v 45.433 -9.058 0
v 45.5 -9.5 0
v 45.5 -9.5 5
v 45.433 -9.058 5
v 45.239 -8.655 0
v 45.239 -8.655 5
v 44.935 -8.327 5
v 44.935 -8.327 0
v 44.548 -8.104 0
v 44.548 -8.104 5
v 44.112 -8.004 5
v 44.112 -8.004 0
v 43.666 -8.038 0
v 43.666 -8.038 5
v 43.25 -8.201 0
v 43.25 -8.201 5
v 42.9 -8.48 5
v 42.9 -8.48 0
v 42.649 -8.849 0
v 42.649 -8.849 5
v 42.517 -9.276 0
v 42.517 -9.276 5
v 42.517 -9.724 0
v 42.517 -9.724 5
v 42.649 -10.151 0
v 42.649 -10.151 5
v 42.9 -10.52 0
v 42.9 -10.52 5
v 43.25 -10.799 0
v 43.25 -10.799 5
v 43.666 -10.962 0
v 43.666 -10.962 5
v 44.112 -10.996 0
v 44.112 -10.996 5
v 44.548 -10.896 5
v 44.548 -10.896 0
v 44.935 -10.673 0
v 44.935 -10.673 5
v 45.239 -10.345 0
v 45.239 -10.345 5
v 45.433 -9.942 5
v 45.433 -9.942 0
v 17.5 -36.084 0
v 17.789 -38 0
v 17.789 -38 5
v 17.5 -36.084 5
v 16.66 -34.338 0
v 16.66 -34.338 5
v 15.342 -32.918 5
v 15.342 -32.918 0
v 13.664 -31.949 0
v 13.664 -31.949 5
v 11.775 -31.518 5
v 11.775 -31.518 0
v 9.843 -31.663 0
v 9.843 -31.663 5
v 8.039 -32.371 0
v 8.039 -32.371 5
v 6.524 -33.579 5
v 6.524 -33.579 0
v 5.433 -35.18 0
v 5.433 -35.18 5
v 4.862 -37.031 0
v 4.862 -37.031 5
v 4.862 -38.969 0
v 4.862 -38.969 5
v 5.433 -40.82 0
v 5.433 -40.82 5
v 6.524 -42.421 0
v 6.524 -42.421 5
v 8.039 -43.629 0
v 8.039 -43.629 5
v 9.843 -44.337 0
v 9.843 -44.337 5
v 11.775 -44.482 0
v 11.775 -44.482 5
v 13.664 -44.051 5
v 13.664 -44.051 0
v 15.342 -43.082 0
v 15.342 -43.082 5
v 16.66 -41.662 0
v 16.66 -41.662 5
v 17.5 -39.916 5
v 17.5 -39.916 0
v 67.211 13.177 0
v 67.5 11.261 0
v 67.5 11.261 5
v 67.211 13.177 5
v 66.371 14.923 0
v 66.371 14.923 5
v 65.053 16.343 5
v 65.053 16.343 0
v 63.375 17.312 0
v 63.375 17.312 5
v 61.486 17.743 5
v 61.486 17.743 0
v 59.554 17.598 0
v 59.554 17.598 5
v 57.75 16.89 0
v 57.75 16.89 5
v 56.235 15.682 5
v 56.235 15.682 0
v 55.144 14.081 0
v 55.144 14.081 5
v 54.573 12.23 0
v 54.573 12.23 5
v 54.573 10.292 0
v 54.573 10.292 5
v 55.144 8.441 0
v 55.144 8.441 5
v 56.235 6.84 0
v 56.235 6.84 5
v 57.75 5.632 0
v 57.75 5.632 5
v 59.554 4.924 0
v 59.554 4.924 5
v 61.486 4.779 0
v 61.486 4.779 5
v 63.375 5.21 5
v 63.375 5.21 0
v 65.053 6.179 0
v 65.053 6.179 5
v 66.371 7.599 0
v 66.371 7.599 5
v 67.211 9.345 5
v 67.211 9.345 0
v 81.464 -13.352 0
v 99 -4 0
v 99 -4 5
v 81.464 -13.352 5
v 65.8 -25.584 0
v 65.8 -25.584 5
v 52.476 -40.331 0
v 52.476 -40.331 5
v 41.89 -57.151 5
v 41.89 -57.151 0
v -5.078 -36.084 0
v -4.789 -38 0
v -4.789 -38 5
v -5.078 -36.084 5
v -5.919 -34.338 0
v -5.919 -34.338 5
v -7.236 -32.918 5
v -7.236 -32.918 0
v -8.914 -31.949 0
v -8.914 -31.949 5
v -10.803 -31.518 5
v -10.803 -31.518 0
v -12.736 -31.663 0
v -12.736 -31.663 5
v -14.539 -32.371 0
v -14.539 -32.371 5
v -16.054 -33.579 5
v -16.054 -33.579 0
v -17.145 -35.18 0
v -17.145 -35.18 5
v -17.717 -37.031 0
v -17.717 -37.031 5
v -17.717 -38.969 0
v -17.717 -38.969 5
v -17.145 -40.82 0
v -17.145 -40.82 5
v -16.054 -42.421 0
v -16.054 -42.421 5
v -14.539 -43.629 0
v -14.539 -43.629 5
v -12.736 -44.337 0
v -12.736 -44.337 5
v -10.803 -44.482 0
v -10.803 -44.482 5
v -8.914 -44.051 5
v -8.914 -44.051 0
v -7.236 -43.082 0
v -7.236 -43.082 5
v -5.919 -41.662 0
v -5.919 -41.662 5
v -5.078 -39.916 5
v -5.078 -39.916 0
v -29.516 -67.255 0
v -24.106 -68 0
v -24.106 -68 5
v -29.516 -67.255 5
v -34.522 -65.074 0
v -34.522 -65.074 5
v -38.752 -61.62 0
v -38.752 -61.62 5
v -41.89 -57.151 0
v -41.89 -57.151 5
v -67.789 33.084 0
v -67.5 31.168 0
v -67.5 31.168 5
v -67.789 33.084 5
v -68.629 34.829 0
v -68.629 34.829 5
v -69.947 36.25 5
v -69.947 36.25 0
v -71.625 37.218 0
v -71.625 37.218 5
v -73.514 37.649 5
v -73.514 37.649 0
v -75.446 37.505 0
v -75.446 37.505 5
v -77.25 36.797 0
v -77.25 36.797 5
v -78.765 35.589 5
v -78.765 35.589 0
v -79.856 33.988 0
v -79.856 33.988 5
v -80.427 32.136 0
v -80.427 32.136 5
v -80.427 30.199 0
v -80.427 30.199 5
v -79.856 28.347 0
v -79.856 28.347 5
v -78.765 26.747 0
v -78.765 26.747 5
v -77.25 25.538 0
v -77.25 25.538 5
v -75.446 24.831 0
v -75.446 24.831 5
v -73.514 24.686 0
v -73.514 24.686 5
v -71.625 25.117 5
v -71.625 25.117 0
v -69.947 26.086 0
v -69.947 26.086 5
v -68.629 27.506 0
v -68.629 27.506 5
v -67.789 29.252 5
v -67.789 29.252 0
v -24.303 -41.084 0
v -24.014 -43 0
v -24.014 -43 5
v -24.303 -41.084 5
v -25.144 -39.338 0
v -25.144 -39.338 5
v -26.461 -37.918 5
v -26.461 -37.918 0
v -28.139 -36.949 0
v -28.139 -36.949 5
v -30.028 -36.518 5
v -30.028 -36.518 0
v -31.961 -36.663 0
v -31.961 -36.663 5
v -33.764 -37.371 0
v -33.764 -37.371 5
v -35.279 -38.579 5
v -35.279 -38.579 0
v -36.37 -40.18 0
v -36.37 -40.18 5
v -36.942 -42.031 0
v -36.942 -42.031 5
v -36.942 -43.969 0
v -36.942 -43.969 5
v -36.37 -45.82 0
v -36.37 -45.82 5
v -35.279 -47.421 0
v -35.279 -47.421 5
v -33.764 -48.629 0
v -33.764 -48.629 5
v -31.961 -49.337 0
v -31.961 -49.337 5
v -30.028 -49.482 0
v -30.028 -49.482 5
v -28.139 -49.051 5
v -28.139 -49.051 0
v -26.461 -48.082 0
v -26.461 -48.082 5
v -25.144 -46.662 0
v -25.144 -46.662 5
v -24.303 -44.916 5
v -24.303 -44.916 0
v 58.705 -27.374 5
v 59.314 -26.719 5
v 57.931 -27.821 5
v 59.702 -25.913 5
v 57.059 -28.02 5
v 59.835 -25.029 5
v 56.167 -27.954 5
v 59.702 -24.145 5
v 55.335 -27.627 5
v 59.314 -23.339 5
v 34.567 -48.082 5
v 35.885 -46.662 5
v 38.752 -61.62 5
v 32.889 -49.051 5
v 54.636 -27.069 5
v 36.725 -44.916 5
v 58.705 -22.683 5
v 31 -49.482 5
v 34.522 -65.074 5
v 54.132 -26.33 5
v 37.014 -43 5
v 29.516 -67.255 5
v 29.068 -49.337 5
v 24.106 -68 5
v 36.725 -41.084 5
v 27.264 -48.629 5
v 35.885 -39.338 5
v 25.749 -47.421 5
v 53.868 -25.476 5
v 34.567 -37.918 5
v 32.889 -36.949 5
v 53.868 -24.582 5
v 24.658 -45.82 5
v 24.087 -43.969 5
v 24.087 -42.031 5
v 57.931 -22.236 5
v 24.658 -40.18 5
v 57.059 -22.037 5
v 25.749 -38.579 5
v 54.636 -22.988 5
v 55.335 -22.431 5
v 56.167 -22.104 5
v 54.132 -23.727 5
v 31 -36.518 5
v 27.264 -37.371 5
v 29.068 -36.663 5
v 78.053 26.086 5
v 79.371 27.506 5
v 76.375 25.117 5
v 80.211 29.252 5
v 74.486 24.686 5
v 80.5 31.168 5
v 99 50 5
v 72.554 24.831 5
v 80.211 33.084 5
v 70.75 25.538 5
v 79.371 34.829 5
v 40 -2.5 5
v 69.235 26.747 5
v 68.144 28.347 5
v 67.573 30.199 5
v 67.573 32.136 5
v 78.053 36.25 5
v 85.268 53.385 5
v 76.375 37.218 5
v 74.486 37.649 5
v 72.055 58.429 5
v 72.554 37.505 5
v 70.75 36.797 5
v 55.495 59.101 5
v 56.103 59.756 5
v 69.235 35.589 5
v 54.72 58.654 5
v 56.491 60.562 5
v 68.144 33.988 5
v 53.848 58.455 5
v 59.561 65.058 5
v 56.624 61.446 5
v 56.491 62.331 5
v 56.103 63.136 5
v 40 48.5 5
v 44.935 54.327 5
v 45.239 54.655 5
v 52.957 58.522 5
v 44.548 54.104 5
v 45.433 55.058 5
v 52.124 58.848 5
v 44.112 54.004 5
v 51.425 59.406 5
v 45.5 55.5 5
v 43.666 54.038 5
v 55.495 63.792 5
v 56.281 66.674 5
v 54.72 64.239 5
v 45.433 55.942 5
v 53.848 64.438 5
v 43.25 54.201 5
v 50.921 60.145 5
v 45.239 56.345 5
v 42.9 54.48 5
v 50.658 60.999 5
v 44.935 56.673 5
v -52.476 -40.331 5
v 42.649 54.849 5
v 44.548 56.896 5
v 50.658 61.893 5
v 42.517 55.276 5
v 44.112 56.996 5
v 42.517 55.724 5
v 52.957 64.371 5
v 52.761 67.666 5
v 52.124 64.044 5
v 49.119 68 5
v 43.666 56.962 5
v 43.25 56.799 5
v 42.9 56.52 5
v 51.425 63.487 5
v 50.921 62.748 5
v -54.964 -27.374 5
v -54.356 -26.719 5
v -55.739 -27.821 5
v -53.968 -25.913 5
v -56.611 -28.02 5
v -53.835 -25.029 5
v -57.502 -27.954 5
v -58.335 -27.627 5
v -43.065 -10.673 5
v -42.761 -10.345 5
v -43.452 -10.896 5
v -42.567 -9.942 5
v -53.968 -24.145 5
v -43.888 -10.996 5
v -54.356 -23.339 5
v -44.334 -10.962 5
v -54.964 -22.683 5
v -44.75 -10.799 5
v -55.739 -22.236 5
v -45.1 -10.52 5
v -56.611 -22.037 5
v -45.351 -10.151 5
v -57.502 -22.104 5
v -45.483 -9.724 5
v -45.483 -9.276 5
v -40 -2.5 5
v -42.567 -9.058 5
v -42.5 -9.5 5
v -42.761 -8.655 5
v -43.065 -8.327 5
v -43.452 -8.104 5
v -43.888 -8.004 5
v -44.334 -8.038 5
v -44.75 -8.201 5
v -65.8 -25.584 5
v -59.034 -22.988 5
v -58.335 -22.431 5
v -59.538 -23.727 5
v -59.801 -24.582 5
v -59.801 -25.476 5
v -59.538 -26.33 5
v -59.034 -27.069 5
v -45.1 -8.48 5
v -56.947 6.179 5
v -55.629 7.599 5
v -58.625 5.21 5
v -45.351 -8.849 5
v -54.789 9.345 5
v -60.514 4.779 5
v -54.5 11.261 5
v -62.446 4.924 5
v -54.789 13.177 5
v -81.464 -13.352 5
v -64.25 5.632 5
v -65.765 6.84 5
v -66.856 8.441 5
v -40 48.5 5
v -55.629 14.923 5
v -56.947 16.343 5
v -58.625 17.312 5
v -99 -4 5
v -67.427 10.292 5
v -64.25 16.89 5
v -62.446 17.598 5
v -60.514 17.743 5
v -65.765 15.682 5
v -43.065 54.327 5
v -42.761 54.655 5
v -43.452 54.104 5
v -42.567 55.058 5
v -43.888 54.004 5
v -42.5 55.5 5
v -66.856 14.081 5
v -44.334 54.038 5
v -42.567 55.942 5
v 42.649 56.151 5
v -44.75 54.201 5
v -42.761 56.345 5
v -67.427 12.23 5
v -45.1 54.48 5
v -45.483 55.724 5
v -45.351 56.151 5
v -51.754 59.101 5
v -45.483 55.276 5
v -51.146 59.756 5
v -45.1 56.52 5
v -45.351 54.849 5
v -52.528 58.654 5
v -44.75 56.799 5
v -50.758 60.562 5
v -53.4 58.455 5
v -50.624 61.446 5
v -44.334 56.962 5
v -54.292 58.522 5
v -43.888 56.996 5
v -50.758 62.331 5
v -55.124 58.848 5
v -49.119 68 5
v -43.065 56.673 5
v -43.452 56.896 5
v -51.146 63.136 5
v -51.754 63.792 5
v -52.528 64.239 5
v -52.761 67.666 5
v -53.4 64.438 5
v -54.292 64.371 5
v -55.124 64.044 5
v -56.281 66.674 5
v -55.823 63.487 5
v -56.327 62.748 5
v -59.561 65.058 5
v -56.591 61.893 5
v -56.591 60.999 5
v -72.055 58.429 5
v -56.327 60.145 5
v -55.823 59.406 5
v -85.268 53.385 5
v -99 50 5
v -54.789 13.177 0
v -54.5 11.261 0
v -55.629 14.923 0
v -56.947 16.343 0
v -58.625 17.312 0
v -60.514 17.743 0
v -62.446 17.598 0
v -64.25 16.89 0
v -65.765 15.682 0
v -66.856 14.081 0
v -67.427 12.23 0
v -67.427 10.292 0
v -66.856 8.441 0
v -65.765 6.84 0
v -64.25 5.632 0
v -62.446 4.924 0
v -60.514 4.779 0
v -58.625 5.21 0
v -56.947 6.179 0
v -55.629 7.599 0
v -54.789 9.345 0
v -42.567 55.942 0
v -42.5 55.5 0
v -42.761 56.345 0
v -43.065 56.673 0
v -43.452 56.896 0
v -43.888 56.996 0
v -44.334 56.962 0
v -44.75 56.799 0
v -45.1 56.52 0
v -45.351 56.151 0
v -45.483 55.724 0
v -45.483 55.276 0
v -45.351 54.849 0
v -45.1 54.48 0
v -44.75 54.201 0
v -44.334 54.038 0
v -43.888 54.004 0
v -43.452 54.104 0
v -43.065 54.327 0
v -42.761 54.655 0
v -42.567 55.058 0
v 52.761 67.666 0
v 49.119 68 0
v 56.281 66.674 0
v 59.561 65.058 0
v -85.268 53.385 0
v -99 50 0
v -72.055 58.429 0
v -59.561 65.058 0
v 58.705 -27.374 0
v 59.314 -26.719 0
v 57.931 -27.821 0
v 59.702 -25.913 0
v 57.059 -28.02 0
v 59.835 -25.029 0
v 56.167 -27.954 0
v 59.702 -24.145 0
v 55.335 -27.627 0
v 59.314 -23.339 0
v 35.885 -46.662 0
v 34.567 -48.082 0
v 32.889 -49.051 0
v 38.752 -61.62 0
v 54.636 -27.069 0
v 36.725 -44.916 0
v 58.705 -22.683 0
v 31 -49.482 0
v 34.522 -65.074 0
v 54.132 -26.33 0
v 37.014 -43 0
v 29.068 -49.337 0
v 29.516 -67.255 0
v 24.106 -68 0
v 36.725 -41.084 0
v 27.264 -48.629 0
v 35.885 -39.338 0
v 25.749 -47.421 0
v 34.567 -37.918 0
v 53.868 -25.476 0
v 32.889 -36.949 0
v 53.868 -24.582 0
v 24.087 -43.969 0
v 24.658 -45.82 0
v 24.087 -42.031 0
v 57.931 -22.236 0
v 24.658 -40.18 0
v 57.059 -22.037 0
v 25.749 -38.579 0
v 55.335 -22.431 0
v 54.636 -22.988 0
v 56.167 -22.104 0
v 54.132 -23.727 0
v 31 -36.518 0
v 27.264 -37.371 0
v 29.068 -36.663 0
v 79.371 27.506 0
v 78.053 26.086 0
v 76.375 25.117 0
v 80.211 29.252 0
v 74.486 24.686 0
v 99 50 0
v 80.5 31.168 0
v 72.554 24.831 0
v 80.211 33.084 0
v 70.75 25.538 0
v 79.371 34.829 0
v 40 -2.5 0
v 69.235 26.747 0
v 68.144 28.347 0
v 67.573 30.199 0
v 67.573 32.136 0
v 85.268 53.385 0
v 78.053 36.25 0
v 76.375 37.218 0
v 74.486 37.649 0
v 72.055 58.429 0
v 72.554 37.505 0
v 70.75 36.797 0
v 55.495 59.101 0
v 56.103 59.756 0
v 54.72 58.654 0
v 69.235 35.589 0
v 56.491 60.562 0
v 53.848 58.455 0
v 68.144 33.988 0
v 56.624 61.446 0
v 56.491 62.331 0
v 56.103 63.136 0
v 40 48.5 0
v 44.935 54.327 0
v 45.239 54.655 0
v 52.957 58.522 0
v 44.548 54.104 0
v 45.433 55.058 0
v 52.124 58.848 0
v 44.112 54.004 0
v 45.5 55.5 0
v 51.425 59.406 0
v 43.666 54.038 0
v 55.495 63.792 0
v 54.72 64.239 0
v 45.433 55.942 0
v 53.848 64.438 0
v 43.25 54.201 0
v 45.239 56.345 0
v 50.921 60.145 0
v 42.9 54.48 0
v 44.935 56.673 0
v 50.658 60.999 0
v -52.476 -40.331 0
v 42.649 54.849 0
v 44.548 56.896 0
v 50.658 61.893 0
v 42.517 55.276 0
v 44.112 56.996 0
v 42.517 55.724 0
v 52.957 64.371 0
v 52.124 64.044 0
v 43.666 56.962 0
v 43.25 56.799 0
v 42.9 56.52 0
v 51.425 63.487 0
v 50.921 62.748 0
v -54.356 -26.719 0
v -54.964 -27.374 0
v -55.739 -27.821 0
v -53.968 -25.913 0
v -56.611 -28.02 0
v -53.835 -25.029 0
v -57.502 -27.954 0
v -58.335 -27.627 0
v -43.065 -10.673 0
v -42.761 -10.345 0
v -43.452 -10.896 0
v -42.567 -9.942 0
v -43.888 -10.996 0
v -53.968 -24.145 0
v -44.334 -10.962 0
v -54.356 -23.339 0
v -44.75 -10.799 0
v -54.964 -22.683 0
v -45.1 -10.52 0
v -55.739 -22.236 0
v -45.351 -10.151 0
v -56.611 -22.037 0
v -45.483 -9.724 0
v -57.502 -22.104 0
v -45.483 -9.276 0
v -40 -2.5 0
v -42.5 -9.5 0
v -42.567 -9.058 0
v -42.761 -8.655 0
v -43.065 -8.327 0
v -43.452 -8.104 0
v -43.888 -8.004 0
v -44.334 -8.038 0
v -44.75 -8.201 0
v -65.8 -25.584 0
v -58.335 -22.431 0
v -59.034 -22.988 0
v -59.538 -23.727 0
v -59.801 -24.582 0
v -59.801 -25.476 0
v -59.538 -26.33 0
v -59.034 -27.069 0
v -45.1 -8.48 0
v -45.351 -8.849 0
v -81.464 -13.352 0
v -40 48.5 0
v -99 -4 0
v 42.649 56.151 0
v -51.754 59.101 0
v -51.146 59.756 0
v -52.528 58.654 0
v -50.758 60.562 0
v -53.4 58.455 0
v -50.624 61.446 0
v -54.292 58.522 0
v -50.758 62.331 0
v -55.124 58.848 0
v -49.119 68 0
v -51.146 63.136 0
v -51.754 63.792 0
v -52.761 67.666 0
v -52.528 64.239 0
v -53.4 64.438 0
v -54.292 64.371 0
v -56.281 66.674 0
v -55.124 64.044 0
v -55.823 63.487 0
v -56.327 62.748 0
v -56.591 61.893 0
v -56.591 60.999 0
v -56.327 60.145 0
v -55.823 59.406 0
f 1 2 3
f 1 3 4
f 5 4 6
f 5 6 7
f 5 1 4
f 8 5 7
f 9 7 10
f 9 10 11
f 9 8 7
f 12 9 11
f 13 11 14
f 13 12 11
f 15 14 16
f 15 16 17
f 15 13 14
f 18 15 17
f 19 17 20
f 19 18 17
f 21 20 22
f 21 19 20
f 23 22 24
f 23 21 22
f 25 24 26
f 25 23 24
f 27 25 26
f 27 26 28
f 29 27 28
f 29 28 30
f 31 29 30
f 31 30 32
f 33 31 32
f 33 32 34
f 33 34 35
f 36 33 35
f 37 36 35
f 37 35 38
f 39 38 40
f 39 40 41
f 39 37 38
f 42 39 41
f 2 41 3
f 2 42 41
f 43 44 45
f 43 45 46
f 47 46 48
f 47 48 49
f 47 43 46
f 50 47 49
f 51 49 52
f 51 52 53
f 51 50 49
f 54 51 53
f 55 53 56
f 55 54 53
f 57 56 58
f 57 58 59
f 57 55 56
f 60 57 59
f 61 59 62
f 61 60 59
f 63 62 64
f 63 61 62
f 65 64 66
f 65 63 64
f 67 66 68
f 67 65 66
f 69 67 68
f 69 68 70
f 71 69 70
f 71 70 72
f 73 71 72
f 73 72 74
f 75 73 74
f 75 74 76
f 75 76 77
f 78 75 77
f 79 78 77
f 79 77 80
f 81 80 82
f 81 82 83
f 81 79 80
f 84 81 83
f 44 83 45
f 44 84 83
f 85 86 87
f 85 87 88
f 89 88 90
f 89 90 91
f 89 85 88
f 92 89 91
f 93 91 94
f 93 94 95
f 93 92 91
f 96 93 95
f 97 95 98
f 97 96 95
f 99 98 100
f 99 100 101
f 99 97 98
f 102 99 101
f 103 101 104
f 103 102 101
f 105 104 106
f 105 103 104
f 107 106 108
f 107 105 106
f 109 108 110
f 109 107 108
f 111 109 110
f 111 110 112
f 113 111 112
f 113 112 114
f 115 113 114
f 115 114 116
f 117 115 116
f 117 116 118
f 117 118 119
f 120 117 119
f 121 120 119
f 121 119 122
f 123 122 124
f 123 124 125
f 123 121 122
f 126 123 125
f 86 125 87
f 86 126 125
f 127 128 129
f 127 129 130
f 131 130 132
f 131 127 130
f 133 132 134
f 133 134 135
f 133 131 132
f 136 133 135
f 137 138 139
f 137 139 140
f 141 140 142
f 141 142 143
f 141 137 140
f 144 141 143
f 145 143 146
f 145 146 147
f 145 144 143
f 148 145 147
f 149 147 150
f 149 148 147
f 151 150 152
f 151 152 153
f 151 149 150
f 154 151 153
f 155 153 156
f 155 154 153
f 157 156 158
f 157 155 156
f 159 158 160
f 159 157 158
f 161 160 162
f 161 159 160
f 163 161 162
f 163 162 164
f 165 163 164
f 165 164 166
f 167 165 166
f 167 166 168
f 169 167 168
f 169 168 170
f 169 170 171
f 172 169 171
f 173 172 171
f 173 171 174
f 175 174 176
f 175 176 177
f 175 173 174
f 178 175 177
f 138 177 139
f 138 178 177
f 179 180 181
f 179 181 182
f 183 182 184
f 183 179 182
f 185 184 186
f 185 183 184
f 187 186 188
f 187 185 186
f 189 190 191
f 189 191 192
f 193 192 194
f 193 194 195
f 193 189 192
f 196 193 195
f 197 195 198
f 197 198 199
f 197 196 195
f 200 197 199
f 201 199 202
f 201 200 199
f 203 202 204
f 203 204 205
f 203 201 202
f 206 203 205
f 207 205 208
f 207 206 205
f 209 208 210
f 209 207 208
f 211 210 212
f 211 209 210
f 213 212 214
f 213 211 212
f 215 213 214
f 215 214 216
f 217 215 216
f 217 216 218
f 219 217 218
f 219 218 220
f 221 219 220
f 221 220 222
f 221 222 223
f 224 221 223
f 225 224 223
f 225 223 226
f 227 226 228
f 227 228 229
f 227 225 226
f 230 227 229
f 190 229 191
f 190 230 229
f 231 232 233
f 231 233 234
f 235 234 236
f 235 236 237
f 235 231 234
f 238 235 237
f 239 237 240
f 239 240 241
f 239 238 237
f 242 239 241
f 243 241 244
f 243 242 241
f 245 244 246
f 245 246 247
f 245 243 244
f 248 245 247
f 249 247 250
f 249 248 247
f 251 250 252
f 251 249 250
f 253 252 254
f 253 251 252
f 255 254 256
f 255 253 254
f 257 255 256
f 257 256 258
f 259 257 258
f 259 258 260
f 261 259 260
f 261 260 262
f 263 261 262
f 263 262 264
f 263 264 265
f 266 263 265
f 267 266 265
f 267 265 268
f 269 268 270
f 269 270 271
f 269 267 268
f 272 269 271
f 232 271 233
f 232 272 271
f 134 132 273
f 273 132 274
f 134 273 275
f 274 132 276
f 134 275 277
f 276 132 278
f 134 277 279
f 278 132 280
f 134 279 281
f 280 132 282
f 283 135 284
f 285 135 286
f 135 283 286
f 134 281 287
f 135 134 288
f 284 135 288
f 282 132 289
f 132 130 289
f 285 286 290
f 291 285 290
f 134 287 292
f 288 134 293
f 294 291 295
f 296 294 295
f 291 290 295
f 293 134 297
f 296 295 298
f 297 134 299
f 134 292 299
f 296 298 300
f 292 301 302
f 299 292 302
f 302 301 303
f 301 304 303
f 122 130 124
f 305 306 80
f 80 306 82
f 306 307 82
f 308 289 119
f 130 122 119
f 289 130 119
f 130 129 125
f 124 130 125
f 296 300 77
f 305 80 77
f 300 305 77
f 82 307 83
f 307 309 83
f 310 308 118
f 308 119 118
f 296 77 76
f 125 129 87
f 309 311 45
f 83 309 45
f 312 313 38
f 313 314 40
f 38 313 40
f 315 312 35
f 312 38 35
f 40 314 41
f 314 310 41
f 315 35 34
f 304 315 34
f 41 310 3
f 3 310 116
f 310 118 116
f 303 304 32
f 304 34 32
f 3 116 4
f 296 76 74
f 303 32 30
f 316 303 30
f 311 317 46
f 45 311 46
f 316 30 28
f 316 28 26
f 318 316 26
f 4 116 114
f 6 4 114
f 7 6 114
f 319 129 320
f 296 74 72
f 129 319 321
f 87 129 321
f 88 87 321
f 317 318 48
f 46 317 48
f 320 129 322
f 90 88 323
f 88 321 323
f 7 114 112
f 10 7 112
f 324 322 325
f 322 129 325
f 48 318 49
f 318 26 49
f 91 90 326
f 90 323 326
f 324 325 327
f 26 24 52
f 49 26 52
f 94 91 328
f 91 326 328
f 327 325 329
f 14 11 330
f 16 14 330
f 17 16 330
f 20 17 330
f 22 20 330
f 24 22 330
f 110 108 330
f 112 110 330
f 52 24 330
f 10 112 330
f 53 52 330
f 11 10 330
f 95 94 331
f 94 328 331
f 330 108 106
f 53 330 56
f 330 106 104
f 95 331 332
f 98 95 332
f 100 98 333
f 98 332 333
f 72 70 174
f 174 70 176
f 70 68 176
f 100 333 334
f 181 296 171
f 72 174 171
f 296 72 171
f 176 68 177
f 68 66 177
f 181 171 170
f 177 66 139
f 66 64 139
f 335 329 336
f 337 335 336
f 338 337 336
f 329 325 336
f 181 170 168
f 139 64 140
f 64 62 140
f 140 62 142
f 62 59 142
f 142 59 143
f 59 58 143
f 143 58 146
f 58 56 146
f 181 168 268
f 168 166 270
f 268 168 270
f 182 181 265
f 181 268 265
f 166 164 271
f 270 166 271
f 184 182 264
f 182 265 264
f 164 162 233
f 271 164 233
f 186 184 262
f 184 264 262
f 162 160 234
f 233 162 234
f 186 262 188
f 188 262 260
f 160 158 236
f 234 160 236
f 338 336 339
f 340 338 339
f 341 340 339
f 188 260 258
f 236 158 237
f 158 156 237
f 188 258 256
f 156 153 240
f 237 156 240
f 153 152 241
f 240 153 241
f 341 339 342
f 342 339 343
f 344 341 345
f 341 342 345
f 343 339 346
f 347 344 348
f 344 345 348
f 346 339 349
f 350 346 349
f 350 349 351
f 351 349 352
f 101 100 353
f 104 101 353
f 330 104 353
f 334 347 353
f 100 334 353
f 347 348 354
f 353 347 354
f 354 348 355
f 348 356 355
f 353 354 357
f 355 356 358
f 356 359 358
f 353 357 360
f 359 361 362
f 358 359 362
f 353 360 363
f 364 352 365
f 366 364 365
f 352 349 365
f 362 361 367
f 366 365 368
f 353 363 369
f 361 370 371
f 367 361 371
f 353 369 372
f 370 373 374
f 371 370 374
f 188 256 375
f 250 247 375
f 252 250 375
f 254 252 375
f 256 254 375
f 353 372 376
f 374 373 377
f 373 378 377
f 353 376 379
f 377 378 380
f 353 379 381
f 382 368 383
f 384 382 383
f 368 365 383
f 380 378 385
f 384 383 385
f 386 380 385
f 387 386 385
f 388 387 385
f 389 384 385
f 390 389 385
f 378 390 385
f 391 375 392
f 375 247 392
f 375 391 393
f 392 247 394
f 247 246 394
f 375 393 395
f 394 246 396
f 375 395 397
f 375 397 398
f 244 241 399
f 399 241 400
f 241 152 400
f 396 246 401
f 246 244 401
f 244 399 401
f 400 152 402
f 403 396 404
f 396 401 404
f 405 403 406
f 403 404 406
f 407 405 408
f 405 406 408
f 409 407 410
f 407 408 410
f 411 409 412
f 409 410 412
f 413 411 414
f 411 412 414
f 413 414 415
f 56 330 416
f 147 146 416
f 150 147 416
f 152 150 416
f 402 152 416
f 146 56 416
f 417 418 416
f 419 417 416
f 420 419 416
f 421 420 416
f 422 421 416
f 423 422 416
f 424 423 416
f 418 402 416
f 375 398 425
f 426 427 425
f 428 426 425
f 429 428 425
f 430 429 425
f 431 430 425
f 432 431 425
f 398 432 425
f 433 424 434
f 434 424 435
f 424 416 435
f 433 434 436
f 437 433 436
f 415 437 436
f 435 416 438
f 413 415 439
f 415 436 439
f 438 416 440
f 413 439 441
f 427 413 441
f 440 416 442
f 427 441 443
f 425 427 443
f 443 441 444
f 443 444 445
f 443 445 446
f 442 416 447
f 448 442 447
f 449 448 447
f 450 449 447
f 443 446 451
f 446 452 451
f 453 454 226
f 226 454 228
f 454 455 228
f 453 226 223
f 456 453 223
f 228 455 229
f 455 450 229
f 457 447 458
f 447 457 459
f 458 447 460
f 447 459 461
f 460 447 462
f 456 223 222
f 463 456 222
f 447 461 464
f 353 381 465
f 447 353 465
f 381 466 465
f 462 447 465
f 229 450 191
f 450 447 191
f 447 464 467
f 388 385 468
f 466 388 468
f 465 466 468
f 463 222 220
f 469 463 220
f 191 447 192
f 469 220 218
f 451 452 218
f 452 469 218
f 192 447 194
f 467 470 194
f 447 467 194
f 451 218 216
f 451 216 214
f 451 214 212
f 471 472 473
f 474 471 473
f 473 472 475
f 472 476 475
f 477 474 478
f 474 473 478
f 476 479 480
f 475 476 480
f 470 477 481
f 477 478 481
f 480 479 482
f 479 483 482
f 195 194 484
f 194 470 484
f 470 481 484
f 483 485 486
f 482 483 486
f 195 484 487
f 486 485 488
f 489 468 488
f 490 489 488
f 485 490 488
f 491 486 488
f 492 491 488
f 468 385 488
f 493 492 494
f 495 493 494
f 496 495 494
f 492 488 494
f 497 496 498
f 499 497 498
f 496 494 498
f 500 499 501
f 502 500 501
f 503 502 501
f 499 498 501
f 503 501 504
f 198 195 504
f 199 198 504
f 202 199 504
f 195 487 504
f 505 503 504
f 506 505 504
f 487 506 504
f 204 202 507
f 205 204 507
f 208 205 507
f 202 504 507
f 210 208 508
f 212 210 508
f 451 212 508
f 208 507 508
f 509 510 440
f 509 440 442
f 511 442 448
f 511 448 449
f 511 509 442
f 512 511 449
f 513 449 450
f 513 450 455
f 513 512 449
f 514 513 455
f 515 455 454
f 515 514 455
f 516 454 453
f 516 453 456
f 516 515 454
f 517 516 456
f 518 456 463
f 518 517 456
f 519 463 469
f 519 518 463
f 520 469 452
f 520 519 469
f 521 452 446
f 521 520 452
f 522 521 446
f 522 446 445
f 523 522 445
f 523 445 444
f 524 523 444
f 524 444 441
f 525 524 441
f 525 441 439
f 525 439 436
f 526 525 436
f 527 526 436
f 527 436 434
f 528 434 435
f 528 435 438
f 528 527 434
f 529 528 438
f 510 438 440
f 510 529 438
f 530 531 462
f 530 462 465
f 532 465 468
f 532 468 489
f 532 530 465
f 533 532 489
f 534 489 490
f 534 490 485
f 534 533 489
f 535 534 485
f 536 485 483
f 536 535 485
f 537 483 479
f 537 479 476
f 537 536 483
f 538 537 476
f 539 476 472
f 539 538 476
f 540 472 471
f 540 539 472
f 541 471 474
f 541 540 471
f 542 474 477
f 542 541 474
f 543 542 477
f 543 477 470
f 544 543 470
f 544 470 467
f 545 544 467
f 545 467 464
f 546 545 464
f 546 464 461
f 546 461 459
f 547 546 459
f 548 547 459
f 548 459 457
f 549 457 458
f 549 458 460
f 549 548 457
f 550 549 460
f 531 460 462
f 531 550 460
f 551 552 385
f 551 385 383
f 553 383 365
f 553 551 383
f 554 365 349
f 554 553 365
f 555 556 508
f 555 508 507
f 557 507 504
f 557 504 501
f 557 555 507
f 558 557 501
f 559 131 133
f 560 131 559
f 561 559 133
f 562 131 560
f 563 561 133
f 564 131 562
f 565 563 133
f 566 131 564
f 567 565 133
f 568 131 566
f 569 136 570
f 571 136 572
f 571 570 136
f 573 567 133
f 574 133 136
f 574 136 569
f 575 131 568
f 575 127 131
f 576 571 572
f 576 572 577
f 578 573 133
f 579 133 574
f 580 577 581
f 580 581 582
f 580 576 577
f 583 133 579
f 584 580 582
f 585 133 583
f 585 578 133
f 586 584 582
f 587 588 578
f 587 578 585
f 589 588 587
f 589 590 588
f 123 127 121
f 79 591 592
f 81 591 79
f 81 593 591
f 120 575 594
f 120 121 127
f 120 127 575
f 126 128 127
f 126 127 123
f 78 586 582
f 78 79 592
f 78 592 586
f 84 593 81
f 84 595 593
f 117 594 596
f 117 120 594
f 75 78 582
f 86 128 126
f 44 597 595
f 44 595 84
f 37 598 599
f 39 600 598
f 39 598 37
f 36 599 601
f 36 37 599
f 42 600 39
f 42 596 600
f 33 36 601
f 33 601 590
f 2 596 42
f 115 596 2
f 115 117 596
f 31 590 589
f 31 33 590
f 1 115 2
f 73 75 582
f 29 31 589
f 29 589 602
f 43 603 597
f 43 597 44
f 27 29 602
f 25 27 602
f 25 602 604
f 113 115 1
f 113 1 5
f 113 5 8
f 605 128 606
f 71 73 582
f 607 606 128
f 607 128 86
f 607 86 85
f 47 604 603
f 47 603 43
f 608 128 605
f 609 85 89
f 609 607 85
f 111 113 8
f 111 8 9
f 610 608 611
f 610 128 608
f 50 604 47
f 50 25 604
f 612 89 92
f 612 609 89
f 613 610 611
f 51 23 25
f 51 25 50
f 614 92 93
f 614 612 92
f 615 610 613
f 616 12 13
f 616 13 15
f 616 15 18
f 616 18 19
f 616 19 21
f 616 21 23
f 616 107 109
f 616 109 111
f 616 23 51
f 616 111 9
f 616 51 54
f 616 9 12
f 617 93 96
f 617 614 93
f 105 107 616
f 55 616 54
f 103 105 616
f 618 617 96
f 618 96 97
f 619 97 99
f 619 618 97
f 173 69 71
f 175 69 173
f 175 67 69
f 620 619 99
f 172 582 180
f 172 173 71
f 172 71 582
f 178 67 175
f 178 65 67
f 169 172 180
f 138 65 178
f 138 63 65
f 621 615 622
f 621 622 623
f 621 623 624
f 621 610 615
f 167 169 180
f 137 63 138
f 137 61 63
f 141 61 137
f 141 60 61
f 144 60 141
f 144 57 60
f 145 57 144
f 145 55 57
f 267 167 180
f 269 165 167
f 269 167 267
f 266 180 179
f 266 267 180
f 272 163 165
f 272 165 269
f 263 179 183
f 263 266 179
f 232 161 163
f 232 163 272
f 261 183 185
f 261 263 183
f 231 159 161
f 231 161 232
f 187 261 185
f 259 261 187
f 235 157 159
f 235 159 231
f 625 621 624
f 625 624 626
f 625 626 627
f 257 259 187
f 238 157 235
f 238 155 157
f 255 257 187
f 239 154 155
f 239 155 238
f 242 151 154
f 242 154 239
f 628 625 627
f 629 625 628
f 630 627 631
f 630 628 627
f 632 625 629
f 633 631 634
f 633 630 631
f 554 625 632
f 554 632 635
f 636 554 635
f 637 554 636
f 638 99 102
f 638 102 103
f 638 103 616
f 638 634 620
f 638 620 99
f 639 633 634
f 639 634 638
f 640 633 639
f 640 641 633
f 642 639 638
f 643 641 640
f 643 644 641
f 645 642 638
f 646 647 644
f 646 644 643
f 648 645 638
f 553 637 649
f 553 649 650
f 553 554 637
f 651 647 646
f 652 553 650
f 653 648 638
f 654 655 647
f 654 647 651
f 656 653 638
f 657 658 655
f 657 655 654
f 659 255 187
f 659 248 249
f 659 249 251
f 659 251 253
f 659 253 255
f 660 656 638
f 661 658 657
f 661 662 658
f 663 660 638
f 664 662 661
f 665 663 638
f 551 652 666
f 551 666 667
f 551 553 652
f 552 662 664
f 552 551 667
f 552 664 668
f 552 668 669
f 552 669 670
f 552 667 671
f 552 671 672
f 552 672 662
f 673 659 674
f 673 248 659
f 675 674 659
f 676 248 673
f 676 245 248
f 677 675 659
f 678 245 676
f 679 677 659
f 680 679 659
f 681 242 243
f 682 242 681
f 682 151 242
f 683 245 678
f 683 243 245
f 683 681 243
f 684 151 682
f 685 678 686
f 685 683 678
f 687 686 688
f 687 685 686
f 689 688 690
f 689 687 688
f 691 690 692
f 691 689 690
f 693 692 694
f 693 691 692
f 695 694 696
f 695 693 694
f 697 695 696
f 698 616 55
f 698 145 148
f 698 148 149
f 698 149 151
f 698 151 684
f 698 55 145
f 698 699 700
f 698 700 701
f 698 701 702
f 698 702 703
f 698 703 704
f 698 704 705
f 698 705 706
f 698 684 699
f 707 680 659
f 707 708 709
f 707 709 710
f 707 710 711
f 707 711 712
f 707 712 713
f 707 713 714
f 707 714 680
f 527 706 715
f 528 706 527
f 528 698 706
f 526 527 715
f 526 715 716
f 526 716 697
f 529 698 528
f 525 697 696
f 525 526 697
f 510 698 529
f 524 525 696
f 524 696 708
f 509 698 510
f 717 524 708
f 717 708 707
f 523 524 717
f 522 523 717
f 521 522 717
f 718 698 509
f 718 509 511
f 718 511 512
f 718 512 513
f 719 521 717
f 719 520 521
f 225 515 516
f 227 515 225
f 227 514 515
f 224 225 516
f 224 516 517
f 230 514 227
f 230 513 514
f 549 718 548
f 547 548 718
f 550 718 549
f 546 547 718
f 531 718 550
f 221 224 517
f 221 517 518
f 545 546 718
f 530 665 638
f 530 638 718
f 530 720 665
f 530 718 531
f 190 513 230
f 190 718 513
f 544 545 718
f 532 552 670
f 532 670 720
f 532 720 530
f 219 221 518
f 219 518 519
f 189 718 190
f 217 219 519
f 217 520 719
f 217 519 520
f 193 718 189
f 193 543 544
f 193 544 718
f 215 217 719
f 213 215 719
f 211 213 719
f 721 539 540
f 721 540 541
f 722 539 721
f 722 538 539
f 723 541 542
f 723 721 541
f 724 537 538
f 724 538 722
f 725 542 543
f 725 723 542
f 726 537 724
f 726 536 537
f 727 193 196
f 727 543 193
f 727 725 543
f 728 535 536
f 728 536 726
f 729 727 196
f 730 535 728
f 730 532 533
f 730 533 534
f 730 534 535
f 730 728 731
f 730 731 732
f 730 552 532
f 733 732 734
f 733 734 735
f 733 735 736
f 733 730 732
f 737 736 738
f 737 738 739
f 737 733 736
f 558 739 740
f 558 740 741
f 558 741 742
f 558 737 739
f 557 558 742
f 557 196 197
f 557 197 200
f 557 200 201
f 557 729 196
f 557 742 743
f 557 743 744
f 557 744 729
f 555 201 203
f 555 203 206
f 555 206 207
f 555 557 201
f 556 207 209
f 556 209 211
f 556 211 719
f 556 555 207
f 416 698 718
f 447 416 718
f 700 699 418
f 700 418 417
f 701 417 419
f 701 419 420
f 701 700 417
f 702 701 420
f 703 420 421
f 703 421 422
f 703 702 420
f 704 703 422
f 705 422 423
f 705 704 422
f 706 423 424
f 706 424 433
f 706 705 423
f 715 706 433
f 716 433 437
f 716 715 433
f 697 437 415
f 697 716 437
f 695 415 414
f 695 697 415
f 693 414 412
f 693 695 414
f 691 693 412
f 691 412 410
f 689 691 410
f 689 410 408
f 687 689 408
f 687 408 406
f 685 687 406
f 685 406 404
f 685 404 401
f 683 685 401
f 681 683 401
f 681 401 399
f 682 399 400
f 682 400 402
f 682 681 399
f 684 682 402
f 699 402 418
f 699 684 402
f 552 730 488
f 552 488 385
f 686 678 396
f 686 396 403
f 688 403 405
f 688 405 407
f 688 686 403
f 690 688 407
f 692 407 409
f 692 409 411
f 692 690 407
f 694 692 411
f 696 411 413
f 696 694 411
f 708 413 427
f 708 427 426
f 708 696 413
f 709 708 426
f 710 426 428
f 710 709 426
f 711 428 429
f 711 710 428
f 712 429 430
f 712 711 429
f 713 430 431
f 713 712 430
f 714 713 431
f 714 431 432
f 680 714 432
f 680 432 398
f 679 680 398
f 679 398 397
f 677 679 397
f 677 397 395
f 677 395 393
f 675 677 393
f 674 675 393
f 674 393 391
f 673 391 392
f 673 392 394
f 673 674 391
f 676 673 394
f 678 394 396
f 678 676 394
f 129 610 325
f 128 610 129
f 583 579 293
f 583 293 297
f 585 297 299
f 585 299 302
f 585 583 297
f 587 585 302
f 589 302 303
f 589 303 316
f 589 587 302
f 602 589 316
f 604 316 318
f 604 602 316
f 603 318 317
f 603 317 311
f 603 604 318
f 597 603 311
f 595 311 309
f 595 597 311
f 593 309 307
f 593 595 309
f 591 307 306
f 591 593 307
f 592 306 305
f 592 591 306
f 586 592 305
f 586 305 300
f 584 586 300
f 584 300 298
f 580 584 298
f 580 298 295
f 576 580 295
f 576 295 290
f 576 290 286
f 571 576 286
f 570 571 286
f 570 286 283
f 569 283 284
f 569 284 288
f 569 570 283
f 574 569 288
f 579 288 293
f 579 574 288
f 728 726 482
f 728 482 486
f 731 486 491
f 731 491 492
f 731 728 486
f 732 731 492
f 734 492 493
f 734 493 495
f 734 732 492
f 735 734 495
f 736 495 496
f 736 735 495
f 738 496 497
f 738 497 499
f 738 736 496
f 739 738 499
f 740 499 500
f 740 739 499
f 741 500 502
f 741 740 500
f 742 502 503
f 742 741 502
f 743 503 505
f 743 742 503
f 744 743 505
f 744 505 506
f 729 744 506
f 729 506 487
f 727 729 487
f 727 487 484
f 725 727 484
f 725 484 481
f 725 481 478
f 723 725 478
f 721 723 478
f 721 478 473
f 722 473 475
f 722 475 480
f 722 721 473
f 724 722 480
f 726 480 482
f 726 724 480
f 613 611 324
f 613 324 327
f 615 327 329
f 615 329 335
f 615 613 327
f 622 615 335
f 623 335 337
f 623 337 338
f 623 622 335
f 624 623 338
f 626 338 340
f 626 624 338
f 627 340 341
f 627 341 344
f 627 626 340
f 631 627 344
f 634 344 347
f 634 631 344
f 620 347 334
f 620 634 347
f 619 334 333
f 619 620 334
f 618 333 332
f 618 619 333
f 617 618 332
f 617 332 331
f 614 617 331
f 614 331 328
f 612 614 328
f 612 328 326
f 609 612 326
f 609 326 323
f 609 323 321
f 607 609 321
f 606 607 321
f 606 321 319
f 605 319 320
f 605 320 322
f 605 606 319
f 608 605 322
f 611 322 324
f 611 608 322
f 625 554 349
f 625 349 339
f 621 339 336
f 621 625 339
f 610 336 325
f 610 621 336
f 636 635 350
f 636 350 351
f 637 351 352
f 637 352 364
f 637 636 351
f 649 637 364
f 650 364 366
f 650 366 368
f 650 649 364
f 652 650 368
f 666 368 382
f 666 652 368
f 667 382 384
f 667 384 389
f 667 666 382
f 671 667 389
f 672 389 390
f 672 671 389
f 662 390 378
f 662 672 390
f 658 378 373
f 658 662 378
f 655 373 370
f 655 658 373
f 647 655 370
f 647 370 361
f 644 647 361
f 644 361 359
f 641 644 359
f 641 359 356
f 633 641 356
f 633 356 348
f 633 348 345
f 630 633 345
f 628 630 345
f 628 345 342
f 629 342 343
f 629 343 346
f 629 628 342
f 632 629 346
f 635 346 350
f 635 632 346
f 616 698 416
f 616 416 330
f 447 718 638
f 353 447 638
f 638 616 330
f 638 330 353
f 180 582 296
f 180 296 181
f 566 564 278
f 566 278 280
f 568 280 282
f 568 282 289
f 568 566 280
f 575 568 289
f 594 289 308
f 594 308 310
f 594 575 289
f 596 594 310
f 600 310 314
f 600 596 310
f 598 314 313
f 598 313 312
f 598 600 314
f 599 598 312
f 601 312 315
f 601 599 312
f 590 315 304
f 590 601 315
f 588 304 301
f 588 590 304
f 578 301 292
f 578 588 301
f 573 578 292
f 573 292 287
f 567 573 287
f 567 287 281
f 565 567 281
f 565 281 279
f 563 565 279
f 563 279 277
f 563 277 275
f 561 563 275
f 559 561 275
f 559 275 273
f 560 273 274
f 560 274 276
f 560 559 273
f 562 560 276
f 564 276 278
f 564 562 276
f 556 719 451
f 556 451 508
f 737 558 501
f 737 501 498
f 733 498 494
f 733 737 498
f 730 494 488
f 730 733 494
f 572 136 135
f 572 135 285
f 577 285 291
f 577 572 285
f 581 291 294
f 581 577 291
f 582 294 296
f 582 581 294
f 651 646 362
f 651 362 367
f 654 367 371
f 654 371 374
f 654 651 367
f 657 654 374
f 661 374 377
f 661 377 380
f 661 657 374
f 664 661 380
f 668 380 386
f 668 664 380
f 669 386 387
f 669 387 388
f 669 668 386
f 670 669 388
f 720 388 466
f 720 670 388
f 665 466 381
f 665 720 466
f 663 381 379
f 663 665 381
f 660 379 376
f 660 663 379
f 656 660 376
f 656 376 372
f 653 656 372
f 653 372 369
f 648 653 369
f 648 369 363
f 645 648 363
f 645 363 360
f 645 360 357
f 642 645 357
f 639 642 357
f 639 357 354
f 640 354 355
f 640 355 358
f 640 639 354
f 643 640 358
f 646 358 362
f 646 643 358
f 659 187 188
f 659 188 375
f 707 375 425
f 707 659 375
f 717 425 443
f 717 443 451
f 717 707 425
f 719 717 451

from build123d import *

# Parameters (mm, degrees)
ESBO_O1_R                = 6.5
ESBO_O1_R_2              = 3
ESBO_O1_R_3              = 1.5
ESBO_O1_W                = 80
ESBO_O1_H                = 51
RESSALTO_EXTRUS_O1_DEPTH = 5


with BuildPart() as part:
    # Esboço1 → Ressalto-extrusão1 (new body)
    with BuildSketch(Plane.XY):
        with BuildLine():
            Line((-49.119135606, 68), (49.119135606, 68))
            ThreePointArc((49.119135606, 68), (54.543435225, 67.250375935), (59.56111629, 65.057697365))
            ThreePointArc((59.56111629, 65.057697365), (78.583692726, 55.703629757), (99, 50))
            Line((99, 50), (99, -4))
            ThreePointArc((99, -4), (65.800143376, -25.584477196), (41.890064111, -57.150728877))
            ThreePointArc((41.890064111, -57.150728877), (34.522230169, -65.073584532), (24.106246719, -68))
            Line((24.106246719, -68), (-24.106246719, -68))
            ThreePointArc((-24.106246719, -68), (-34.522230169, -65.073584532), (-41.890064111, -57.150728877))
            ThreePointArc((-41.890064111, -57.150728877), (-65.800143376, -25.584477196), (-99, -4))
            Line((-99, -4), (-99, 50))
            ThreePointArc((-99, 50), (-78.583692726, 55.703629757), (-59.56111629, 65.057697365))
            ThreePointArc((-59.56111629, 65.057697365), (-54.543435225, 67.250375935), (-49.119135606, 68))
        make_face()
        with Locations((74, 31.167626134)):
            Circle(ESBO_O1_R, mode=Mode.SUBTRACT)
        with Locations((61, 11.261041117)):
            Circle(ESBO_O1_R, mode=Mode.SUBTRACT)
        with Locations((11.289140568, -38)):
            Circle(ESBO_O1_R, mode=Mode.SUBTRACT)
        with Locations((30.514158569, -43)):
            Circle(ESBO_O1_R, mode=Mode.SUBTRACT)
        with Locations((-53.62430165, 61.446355775)):
            Circle(ESBO_O1_R_2, mode=Mode.SUBTRACT)
        with Locations((-56.834913612, -25.028841797)):
            Circle(ESBO_O1_R_2, mode=Mode.SUBTRACT)
        with Locations((-44, 55.5)):
            Circle(ESBO_O1_R_3, mode=Mode.SUBTRACT)
        with Locations((-44, -9.5)):
            Circle(ESBO_O1_R_3, mode=Mode.SUBTRACT)
        with Locations((44, -9.5)):
            Circle(ESBO_O1_R_3, mode=Mode.SUBTRACT)
        with Locations((44, 55.5)):
            Circle(ESBO_O1_R_3, mode=Mode.SUBTRACT)
        with Locations((56.834913612, -25.028841797)):
            Circle(ESBO_O1_R_2, mode=Mode.SUBTRACT)
        with Locations((-30.514158569, -43)):
            Circle(ESBO_O1_R, mode=Mode.SUBTRACT)
        with Locations((-11.289140568, -38)):
            Circle(ESBO_O1_R, mode=Mode.SUBTRACT)
        with Locations((-61, 11.261041117)):
            Circle(ESBO_O1_R, mode=Mode.SUBTRACT)
        with Locations((53.62430165, 61.446355775)):
            Circle(ESBO_O1_R_2, mode=Mode.SUBTRACT)
        with Locations((-74, 31.167626134)):
            Circle(ESBO_O1_R, mode=Mode.SUBTRACT)
        with Locations((0, 23)):
            Rectangle(ESBO_O1_W, ESBO_O1_H, mode=Mode.SUBTRACT)
    extrude(amount=RESSALTO_EXTRUS_O1_DEPTH)


solid = part.part
